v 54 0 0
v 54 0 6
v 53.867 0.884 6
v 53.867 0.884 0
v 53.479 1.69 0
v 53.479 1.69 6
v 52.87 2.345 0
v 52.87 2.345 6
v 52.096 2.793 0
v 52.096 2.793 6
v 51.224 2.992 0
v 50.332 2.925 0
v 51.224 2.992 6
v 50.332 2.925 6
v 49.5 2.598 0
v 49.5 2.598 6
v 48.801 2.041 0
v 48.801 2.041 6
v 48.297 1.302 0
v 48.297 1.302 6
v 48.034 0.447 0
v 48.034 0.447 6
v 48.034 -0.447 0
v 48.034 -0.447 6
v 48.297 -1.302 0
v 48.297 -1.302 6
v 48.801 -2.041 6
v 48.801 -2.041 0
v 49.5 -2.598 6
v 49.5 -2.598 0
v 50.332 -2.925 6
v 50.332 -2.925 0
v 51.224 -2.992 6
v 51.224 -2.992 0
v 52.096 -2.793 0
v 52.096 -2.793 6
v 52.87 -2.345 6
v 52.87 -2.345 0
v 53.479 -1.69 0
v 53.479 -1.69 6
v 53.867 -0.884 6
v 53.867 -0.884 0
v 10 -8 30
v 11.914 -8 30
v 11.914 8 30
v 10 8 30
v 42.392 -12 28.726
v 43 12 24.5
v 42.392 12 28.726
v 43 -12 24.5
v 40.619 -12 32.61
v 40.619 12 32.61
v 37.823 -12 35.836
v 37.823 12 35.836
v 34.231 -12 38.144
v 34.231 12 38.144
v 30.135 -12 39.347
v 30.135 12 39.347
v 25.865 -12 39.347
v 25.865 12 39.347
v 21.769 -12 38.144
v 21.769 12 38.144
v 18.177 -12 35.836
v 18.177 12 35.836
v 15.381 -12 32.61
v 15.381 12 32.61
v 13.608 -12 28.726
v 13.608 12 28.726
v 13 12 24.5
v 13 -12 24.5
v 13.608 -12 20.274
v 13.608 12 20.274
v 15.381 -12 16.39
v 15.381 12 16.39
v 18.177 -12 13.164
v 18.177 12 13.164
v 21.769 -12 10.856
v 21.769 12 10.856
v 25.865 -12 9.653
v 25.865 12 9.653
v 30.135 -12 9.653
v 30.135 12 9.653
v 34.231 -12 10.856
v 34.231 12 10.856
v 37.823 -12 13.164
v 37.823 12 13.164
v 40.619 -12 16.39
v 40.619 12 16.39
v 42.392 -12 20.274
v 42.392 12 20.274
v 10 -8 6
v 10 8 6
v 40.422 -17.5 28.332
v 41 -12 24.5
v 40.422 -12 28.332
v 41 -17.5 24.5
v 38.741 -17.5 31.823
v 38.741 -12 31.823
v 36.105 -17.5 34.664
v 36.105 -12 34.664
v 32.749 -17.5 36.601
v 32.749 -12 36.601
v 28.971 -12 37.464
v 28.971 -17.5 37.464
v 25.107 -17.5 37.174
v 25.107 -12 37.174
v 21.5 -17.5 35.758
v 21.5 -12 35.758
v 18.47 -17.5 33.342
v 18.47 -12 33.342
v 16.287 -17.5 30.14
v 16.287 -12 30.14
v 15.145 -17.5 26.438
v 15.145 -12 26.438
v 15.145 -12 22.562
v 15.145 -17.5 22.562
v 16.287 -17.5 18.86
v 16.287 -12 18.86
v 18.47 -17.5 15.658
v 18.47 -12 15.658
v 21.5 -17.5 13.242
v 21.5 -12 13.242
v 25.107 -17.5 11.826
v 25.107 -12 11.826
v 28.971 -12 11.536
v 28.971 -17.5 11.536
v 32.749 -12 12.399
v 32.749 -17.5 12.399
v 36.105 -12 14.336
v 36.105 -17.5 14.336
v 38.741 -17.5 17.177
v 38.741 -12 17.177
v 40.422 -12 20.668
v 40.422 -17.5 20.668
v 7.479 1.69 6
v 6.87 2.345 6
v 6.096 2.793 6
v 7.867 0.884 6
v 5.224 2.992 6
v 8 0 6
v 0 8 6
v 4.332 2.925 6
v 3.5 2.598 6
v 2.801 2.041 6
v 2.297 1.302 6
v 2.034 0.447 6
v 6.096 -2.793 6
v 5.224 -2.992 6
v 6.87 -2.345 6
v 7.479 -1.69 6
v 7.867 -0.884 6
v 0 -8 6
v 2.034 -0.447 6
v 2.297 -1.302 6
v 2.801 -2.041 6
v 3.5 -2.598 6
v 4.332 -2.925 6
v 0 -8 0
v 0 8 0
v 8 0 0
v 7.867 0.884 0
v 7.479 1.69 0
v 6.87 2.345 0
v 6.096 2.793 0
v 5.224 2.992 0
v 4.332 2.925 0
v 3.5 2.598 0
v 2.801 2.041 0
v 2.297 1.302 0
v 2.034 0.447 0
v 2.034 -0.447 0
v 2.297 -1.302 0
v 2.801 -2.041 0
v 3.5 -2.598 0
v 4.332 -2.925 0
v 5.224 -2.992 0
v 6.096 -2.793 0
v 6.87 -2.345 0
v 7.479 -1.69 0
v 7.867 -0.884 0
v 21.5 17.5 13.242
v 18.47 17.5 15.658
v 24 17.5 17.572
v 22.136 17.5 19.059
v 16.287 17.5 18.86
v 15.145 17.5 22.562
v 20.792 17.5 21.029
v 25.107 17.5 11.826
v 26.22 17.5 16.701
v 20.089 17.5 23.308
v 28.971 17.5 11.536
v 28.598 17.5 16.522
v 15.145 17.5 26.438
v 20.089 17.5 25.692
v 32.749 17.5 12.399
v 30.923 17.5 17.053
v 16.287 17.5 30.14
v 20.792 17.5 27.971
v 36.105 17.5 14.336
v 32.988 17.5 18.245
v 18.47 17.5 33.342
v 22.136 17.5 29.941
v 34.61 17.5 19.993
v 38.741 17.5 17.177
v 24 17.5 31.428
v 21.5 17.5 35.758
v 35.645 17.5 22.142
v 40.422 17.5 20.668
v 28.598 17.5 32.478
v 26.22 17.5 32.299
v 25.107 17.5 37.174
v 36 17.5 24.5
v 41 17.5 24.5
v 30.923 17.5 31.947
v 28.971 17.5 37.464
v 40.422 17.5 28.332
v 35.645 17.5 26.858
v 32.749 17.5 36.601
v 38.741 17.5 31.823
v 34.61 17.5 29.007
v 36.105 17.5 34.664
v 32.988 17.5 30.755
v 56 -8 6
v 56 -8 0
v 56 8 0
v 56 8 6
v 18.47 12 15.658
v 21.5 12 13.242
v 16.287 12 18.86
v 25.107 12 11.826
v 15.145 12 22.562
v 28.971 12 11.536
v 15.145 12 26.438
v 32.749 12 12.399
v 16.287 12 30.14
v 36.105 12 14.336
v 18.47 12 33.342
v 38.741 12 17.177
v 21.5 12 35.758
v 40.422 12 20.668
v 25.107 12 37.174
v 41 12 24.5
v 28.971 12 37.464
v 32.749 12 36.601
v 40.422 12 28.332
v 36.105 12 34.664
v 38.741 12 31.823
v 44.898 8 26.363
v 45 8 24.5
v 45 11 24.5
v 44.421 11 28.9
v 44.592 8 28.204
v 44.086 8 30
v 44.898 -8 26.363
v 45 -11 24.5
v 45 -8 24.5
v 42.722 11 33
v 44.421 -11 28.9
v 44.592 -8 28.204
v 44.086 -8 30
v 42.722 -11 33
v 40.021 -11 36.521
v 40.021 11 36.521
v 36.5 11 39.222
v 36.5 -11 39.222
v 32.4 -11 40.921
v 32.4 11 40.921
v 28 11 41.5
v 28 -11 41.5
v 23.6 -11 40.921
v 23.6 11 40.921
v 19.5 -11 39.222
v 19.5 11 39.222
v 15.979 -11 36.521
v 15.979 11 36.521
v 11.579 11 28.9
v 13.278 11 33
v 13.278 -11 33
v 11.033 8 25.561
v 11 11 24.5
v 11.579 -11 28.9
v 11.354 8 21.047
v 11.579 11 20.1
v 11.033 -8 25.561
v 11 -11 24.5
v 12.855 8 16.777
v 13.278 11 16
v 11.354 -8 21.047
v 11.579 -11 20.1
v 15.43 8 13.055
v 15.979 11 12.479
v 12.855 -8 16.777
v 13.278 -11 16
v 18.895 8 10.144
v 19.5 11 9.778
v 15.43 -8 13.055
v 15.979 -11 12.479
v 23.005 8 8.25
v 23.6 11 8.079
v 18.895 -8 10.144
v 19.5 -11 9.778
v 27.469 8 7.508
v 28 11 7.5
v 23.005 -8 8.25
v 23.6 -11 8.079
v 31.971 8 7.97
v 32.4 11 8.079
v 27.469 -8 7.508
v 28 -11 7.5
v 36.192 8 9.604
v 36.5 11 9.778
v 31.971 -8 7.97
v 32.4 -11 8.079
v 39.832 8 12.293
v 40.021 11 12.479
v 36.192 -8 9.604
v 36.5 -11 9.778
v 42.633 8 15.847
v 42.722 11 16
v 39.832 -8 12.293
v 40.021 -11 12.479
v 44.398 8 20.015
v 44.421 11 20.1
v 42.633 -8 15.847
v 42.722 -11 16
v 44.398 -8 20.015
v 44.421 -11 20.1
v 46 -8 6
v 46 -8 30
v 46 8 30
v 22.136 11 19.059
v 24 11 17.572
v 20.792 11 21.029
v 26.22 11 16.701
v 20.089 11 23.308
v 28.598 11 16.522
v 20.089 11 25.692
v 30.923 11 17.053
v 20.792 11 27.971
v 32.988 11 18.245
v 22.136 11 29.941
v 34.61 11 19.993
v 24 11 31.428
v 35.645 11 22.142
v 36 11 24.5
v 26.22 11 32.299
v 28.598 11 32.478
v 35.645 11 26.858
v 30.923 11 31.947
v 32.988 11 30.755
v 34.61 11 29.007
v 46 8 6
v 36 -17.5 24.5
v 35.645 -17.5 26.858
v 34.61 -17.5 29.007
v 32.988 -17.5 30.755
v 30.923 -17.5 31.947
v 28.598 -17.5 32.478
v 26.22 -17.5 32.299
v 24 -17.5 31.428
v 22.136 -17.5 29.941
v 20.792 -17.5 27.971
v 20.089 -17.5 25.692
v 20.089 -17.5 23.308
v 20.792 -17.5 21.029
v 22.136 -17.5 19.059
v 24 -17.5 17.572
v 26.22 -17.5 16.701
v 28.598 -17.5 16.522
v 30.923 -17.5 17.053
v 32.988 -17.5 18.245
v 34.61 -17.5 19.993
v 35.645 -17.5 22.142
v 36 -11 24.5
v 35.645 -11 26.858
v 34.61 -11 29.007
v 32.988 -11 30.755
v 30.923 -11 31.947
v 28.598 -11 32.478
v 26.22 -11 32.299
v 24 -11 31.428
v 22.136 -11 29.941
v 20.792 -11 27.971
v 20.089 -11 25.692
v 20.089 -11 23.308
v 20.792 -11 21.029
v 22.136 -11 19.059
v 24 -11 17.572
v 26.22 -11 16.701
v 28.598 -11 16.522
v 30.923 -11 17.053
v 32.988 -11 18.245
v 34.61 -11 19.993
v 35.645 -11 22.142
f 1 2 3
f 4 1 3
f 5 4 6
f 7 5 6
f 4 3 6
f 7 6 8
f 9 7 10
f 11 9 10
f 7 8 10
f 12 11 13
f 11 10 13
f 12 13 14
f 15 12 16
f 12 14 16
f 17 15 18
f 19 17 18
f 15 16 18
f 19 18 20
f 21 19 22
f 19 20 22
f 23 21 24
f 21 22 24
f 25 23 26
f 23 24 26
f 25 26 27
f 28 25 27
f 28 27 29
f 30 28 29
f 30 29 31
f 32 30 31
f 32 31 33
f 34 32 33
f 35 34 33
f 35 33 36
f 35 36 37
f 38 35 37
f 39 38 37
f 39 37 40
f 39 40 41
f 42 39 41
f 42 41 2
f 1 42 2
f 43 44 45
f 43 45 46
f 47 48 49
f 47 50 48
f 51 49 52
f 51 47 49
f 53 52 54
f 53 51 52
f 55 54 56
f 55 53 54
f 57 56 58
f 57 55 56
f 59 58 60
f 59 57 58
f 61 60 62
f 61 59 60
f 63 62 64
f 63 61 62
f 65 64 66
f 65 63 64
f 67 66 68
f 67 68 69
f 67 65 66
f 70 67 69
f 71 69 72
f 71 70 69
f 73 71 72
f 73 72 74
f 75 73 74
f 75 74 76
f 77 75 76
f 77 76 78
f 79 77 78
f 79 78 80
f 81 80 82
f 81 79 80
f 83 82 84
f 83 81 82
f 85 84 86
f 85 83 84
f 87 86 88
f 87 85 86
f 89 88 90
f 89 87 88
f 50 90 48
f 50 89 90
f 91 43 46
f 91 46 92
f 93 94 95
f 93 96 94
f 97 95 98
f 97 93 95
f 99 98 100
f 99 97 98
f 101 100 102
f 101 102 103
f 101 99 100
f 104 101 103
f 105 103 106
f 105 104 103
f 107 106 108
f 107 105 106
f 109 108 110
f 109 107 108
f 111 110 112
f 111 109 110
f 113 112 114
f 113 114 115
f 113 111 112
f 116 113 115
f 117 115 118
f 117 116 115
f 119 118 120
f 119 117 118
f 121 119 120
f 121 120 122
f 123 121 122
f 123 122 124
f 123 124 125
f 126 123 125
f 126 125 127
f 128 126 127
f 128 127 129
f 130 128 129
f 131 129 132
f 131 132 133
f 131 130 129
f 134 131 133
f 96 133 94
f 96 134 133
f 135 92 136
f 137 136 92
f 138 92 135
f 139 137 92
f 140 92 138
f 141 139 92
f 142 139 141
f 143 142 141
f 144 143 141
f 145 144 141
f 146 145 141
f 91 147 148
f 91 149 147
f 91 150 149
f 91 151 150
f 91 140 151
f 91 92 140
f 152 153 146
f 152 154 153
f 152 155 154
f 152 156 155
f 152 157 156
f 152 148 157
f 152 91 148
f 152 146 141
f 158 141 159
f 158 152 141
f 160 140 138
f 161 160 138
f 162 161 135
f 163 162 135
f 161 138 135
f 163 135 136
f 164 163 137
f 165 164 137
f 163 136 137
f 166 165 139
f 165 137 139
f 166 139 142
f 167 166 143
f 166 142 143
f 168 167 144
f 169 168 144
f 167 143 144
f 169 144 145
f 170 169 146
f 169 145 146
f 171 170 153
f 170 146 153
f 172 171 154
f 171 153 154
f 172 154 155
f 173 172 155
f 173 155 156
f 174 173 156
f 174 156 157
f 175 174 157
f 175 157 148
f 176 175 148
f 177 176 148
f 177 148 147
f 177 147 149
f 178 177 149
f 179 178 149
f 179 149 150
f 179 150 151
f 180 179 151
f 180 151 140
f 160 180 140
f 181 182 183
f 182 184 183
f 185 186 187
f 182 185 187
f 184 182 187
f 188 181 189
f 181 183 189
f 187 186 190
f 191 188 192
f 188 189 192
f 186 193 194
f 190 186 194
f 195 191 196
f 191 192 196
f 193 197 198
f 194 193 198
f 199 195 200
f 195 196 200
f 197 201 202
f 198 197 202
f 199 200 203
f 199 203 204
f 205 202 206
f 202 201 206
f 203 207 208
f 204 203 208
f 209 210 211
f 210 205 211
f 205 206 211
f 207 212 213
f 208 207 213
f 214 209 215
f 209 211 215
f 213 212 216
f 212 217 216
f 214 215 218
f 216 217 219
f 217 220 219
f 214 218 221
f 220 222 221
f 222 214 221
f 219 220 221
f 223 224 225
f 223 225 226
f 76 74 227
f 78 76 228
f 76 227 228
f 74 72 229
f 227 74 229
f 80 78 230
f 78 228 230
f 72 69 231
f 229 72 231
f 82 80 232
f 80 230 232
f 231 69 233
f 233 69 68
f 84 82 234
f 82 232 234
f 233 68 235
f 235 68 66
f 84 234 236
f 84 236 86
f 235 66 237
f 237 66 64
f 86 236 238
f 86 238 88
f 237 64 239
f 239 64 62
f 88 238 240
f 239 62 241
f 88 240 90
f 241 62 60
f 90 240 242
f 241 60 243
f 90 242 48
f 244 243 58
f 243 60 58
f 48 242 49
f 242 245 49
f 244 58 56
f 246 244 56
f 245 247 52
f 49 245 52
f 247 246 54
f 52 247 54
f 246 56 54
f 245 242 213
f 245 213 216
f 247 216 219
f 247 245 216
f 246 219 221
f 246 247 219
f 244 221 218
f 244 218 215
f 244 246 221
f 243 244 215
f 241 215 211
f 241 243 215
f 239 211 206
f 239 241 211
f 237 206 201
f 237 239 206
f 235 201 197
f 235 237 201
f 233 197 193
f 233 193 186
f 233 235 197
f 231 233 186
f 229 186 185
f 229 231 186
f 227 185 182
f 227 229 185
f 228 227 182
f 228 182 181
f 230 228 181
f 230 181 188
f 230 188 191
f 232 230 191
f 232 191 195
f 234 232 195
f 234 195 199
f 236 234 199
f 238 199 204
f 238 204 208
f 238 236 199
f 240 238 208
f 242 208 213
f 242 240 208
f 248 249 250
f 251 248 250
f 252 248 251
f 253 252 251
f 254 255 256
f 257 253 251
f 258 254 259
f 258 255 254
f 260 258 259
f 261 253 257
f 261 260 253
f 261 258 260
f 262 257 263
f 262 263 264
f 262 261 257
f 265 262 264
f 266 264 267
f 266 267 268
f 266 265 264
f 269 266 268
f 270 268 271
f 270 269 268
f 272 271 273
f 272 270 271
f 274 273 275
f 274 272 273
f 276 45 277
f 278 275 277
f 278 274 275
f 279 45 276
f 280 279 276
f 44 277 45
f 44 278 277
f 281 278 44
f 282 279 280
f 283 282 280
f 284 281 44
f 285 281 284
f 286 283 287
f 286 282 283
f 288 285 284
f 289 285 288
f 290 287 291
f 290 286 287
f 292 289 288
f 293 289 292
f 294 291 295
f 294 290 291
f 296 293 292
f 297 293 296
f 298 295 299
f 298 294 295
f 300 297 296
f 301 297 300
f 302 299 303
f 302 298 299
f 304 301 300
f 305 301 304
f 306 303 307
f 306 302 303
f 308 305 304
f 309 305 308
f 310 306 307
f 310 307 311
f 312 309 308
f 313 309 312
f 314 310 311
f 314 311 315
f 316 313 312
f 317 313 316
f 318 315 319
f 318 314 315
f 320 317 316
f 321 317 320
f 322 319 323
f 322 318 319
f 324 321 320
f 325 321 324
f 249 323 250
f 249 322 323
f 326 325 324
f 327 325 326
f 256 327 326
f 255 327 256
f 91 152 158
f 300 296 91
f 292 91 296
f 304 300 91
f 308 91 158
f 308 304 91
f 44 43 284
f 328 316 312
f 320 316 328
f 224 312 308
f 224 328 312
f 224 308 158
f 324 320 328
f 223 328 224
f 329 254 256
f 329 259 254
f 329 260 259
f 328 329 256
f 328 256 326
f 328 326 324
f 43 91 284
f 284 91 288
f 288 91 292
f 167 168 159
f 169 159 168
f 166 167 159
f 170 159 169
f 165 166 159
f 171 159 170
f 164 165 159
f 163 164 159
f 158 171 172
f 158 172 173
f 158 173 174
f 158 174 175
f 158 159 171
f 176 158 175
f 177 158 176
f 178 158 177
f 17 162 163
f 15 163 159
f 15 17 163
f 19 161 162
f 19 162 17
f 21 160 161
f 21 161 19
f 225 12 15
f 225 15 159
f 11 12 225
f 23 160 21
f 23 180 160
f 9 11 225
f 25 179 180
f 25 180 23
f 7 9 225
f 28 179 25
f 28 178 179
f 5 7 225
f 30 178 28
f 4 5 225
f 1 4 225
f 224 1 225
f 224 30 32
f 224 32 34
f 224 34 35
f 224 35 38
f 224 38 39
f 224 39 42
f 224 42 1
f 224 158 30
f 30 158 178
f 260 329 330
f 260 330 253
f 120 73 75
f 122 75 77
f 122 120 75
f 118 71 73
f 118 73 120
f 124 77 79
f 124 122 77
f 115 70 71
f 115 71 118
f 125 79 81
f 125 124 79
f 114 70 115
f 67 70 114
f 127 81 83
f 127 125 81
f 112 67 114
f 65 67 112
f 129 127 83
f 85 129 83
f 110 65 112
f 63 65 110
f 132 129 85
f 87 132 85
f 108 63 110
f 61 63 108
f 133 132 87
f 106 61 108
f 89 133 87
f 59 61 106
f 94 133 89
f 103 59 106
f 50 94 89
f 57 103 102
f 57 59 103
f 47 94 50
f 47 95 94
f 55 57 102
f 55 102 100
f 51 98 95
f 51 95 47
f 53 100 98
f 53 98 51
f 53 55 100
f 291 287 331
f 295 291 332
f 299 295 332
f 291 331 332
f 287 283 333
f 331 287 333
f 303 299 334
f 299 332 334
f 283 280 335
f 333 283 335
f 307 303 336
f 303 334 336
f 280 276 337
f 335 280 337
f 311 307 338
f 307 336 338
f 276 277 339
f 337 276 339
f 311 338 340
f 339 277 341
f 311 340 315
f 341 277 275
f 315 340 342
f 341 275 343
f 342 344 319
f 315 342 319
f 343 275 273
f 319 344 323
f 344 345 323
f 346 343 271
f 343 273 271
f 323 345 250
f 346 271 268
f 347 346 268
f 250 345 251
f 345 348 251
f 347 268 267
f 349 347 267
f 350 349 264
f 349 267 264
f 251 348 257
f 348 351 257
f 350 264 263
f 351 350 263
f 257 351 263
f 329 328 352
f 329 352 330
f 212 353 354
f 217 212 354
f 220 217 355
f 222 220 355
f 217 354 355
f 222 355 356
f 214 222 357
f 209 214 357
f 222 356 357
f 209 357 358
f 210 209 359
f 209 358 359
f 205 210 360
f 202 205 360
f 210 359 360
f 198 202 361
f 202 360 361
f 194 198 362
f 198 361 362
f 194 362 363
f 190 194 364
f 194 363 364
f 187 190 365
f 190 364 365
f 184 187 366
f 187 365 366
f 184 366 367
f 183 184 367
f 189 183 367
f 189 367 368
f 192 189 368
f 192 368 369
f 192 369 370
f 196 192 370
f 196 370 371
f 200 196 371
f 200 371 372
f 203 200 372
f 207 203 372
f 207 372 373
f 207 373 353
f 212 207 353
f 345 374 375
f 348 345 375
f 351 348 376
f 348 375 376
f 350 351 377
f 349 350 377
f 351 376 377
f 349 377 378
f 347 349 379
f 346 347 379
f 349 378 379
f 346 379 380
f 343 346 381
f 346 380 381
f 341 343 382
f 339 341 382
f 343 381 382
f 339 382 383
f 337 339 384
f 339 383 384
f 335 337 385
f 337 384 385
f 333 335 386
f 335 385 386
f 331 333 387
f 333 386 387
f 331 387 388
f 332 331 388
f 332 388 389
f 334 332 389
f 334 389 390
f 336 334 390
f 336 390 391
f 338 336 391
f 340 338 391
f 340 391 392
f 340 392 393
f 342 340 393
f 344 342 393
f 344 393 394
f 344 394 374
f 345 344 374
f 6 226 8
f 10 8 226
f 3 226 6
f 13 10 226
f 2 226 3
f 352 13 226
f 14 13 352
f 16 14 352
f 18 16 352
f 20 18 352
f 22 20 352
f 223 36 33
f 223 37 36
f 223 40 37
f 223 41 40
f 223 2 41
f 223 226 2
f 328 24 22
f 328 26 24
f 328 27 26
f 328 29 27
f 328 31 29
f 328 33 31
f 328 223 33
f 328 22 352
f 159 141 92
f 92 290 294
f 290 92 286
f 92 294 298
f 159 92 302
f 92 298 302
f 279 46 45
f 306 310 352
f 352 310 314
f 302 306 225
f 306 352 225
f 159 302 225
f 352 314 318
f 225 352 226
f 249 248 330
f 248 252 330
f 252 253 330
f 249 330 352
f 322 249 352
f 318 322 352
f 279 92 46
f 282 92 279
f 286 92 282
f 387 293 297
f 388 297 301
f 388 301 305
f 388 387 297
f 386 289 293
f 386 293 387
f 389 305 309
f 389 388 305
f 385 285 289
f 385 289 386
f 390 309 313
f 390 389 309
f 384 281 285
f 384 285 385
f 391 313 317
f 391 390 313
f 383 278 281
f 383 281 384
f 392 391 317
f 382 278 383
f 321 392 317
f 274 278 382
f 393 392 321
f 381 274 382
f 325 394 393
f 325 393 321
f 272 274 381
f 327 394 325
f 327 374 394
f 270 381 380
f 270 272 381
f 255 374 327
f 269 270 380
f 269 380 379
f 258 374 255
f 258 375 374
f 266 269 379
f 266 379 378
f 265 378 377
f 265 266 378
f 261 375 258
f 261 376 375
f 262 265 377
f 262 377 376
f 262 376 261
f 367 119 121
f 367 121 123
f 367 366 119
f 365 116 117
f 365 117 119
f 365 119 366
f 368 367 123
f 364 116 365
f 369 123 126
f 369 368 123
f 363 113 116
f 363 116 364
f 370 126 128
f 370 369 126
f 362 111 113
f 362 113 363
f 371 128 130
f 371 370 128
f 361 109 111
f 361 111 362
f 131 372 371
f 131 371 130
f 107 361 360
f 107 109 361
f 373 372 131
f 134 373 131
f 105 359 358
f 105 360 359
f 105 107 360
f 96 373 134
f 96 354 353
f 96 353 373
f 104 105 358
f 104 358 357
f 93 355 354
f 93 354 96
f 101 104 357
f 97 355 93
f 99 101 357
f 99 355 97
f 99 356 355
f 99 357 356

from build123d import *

# Parameters (mm, degrees)
SKETCH003_R     = 13
PAD003_DEPTH    = 17.5
SKETCH002_R     = 15
PAD002_DEPTH    = 12
SKETCH005_R     = 8
POCKET001_DEPTH = 35.001
SKETCH001_R     = 17
PAD001_DEPTH    = 11
PAD_DEPTH       = 8
SKETCH004_R     = 8
POCKET_DEPTH    = 22.001
SKETCH006_R     = 3
POCKET002_DEPTH = 6.001
SKETCH007_R     = 3
POCKET003_DEPTH = 6.001


with BuildPart() as pad003:
    # Sketch003 → Pad003 (new body, symmetric)
    with BuildSketch(Plane.XZ):
        with Locations((28, 24.5)):
            Circle(SKETCH003_R)
    extrude(amount=PAD003_DEPTH, both=True)


with BuildPart() as flasque_plastique:
    # Sketch002 → Pad002 (new body, symmetric)
    with BuildSketch(Plane.XZ):
        with Locations((28, 24.5)):
            Circle(SKETCH002_R)
    extrude(amount=PAD002_DEPTH, both=True)

    # Fusion001: union Pad003
    add(pad003.part)

    # Sketch005 → Pocket001 (cut, through all)
    with BuildSketch(Plane.XZ.offset(17.5)):
        with Locations((28, 24.5)):
            Circle(SKETCH005_R)
    extrude(amount=-POCKET001_DEPTH, mode=Mode.SUBTRACT)


with BuildPart() as cylindre_alu:
    # Sketch001 → Pad001 (new body, symmetric)
    with BuildSketch(Plane.XZ):
        with Locations((28, 24.5)):
            Circle(SKETCH001_R)
    extrude(amount=PAD001_DEPTH, both=True)


with BuildPart() as alu:
    # Sketch → Pad (new body, symmetric)
    with BuildSketch(Plane.XZ):
        Polygon((0, 0), (56, 0), (56, 6), (46, 6), (46, 30), (10, 30), (10, 6), (0, 6), align=None)
    extrude(amount=PAD_DEPTH, both=True)

    # Fusion: union cylindre alu
    add(cylindre_alu.part)

    # Sketch004 → Pocket (cut, through all)
    with BuildSketch(Plane.XZ.offset(11)):
        with Locations((28, 24.5)):
            Circle(SKETCH004_R)
    extrude(amount=-POCKET_DEPTH, mode=Mode.SUBTRACT)

    # Sketch006 → Pocket002 (cut, through all)
    with BuildSketch(Plane.XY.offset(6)):
        with Locations((5, 0)):
            Circle(SKETCH006_R)
    extrude(amount=-POCKET002_DEPTH, mode=Mode.SUBTRACT)

    # Sketch007 → Pocket003 (cut, through all)
    with BuildSketch(Plane.XY.offset(6)):
        with Locations((51, 0)):
            Circle(SKETCH007_R)
    extrude(amount=-POCKET003_DEPTH, mode=Mode.SUBTRACT)


solid = Compound([flasque_plastique.part, alu.part])
